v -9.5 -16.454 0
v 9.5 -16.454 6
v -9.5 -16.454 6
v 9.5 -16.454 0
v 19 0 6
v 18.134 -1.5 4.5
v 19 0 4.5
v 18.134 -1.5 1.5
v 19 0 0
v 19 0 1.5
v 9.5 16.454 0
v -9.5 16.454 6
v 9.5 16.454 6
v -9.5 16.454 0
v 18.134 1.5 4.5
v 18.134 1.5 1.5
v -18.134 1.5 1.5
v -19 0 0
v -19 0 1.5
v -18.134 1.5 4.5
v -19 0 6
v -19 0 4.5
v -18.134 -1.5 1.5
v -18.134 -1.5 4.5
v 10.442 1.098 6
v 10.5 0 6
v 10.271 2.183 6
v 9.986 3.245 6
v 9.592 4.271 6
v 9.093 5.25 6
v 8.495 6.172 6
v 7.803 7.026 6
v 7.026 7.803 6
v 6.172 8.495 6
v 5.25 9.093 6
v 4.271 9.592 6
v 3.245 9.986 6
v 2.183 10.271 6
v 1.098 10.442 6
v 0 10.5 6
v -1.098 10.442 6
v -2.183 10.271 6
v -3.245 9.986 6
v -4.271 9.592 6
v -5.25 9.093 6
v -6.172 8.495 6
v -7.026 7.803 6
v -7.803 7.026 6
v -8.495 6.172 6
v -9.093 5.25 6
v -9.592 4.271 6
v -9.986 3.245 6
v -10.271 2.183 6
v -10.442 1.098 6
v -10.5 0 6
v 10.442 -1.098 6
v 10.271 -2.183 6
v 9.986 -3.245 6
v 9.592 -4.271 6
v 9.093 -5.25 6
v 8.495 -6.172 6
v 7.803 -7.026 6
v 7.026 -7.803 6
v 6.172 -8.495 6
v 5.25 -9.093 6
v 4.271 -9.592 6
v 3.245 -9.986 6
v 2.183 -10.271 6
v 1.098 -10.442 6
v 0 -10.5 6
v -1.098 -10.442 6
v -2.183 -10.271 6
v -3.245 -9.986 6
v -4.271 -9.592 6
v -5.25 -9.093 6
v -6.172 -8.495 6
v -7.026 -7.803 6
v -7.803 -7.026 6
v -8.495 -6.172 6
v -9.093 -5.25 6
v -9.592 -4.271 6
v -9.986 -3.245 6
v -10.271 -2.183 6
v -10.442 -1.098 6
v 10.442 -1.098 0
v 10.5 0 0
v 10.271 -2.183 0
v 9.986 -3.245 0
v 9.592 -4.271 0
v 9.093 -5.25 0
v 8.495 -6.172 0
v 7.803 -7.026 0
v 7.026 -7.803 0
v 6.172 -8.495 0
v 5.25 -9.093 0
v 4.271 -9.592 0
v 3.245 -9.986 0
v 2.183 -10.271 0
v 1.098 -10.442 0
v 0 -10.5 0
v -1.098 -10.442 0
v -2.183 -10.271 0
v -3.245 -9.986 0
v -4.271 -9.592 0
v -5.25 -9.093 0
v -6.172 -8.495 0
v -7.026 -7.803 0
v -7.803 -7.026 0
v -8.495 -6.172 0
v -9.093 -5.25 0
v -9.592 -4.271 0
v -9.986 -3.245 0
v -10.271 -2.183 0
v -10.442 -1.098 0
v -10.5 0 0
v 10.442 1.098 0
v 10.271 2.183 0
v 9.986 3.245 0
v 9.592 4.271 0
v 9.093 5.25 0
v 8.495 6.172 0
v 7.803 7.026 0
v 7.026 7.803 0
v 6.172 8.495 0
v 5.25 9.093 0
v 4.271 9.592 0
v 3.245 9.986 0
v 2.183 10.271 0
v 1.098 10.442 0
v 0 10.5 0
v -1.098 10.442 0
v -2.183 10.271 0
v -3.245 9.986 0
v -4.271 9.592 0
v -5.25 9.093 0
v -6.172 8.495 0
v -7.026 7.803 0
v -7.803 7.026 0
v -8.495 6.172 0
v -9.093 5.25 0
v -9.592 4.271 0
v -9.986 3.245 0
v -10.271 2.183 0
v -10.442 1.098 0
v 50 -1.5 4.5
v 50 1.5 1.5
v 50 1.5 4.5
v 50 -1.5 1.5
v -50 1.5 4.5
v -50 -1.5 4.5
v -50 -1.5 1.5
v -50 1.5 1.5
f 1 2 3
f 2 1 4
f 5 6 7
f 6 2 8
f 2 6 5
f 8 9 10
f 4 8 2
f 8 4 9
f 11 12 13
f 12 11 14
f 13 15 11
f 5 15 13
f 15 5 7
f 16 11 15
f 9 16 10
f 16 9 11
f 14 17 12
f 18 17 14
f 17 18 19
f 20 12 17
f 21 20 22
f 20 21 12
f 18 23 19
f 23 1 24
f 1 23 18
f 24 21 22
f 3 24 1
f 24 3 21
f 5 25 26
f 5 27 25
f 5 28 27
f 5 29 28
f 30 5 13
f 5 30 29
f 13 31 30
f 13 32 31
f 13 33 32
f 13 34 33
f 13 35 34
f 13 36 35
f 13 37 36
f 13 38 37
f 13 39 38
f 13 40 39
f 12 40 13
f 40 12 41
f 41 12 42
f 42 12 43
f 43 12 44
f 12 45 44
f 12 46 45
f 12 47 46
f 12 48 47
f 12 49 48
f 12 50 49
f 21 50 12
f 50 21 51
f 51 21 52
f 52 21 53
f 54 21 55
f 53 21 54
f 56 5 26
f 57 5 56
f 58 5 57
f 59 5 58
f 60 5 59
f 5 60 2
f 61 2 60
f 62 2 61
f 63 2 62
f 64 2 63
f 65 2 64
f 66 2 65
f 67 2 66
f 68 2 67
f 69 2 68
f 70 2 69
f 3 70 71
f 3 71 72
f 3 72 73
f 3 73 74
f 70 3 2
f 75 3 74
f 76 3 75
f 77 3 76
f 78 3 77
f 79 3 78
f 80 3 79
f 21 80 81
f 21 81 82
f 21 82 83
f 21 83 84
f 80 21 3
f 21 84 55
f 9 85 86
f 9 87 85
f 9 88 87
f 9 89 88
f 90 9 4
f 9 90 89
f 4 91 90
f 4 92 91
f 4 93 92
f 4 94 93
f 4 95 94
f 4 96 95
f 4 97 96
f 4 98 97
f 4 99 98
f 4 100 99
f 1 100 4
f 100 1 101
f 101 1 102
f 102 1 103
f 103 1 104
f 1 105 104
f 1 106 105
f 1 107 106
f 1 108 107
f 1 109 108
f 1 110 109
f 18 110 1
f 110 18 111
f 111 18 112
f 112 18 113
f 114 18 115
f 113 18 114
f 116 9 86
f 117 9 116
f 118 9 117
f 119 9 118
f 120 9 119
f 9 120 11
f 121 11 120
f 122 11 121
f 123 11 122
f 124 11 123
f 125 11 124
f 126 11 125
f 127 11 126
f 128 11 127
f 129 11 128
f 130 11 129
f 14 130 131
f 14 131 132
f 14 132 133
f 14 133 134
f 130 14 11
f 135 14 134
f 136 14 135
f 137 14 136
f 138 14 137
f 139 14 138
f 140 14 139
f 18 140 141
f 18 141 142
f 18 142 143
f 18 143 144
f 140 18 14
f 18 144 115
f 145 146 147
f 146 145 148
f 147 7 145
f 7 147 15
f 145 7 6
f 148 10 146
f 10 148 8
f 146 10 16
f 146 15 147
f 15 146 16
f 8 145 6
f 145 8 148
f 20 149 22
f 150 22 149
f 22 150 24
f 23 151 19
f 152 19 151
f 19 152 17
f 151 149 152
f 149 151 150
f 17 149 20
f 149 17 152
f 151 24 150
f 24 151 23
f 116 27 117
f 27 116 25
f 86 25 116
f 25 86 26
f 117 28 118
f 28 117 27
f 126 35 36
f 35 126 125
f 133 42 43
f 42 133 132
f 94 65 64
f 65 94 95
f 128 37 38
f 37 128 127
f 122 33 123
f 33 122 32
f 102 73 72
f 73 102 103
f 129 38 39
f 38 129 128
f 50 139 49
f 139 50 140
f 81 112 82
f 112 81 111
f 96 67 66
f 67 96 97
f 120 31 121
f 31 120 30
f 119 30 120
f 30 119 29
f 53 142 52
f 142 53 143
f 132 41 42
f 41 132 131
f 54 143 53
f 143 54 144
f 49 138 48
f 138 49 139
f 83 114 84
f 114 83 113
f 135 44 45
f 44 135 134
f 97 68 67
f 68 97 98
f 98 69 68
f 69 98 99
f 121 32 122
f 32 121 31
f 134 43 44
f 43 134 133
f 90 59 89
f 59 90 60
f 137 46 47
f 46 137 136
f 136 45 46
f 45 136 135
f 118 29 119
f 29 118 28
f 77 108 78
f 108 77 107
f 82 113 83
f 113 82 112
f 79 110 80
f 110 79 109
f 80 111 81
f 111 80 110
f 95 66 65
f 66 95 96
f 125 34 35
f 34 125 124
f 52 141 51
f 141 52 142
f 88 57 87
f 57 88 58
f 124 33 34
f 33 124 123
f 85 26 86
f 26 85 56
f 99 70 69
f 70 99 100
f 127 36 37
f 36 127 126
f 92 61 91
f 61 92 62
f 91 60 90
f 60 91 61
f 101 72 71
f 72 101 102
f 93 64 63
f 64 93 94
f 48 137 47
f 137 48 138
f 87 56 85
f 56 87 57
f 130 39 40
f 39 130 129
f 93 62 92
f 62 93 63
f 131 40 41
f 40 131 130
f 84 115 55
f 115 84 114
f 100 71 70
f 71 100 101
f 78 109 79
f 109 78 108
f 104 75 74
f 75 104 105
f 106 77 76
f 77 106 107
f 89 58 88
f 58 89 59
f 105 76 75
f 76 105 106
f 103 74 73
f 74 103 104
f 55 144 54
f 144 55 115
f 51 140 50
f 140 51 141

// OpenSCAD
// Wing nut with two reinforced wings.
$fn = 60;
eps = 0.02;
thread_d = 21;
body_d = 38;
body_h = 6;
wing_l = 32;
wing_t = 3;
difference() {
    union() {
        cylinder(d = body_d, h = body_h, $fn = 6);
        translate([body_d / 2 - 1, -wing_t / 2, body_h / 2 - wing_t / 2]) cube([wing_l, wing_t, wing_t]);
        translate([-body_d / 2 - wing_l + 1, -wing_t / 2, body_h / 2 - wing_t / 2]) cube([wing_l, wing_t, wing_t]);
    }
    translate([0, 0, -eps]) cylinder(d = thread_d, h = body_h + 2 * eps);
}
